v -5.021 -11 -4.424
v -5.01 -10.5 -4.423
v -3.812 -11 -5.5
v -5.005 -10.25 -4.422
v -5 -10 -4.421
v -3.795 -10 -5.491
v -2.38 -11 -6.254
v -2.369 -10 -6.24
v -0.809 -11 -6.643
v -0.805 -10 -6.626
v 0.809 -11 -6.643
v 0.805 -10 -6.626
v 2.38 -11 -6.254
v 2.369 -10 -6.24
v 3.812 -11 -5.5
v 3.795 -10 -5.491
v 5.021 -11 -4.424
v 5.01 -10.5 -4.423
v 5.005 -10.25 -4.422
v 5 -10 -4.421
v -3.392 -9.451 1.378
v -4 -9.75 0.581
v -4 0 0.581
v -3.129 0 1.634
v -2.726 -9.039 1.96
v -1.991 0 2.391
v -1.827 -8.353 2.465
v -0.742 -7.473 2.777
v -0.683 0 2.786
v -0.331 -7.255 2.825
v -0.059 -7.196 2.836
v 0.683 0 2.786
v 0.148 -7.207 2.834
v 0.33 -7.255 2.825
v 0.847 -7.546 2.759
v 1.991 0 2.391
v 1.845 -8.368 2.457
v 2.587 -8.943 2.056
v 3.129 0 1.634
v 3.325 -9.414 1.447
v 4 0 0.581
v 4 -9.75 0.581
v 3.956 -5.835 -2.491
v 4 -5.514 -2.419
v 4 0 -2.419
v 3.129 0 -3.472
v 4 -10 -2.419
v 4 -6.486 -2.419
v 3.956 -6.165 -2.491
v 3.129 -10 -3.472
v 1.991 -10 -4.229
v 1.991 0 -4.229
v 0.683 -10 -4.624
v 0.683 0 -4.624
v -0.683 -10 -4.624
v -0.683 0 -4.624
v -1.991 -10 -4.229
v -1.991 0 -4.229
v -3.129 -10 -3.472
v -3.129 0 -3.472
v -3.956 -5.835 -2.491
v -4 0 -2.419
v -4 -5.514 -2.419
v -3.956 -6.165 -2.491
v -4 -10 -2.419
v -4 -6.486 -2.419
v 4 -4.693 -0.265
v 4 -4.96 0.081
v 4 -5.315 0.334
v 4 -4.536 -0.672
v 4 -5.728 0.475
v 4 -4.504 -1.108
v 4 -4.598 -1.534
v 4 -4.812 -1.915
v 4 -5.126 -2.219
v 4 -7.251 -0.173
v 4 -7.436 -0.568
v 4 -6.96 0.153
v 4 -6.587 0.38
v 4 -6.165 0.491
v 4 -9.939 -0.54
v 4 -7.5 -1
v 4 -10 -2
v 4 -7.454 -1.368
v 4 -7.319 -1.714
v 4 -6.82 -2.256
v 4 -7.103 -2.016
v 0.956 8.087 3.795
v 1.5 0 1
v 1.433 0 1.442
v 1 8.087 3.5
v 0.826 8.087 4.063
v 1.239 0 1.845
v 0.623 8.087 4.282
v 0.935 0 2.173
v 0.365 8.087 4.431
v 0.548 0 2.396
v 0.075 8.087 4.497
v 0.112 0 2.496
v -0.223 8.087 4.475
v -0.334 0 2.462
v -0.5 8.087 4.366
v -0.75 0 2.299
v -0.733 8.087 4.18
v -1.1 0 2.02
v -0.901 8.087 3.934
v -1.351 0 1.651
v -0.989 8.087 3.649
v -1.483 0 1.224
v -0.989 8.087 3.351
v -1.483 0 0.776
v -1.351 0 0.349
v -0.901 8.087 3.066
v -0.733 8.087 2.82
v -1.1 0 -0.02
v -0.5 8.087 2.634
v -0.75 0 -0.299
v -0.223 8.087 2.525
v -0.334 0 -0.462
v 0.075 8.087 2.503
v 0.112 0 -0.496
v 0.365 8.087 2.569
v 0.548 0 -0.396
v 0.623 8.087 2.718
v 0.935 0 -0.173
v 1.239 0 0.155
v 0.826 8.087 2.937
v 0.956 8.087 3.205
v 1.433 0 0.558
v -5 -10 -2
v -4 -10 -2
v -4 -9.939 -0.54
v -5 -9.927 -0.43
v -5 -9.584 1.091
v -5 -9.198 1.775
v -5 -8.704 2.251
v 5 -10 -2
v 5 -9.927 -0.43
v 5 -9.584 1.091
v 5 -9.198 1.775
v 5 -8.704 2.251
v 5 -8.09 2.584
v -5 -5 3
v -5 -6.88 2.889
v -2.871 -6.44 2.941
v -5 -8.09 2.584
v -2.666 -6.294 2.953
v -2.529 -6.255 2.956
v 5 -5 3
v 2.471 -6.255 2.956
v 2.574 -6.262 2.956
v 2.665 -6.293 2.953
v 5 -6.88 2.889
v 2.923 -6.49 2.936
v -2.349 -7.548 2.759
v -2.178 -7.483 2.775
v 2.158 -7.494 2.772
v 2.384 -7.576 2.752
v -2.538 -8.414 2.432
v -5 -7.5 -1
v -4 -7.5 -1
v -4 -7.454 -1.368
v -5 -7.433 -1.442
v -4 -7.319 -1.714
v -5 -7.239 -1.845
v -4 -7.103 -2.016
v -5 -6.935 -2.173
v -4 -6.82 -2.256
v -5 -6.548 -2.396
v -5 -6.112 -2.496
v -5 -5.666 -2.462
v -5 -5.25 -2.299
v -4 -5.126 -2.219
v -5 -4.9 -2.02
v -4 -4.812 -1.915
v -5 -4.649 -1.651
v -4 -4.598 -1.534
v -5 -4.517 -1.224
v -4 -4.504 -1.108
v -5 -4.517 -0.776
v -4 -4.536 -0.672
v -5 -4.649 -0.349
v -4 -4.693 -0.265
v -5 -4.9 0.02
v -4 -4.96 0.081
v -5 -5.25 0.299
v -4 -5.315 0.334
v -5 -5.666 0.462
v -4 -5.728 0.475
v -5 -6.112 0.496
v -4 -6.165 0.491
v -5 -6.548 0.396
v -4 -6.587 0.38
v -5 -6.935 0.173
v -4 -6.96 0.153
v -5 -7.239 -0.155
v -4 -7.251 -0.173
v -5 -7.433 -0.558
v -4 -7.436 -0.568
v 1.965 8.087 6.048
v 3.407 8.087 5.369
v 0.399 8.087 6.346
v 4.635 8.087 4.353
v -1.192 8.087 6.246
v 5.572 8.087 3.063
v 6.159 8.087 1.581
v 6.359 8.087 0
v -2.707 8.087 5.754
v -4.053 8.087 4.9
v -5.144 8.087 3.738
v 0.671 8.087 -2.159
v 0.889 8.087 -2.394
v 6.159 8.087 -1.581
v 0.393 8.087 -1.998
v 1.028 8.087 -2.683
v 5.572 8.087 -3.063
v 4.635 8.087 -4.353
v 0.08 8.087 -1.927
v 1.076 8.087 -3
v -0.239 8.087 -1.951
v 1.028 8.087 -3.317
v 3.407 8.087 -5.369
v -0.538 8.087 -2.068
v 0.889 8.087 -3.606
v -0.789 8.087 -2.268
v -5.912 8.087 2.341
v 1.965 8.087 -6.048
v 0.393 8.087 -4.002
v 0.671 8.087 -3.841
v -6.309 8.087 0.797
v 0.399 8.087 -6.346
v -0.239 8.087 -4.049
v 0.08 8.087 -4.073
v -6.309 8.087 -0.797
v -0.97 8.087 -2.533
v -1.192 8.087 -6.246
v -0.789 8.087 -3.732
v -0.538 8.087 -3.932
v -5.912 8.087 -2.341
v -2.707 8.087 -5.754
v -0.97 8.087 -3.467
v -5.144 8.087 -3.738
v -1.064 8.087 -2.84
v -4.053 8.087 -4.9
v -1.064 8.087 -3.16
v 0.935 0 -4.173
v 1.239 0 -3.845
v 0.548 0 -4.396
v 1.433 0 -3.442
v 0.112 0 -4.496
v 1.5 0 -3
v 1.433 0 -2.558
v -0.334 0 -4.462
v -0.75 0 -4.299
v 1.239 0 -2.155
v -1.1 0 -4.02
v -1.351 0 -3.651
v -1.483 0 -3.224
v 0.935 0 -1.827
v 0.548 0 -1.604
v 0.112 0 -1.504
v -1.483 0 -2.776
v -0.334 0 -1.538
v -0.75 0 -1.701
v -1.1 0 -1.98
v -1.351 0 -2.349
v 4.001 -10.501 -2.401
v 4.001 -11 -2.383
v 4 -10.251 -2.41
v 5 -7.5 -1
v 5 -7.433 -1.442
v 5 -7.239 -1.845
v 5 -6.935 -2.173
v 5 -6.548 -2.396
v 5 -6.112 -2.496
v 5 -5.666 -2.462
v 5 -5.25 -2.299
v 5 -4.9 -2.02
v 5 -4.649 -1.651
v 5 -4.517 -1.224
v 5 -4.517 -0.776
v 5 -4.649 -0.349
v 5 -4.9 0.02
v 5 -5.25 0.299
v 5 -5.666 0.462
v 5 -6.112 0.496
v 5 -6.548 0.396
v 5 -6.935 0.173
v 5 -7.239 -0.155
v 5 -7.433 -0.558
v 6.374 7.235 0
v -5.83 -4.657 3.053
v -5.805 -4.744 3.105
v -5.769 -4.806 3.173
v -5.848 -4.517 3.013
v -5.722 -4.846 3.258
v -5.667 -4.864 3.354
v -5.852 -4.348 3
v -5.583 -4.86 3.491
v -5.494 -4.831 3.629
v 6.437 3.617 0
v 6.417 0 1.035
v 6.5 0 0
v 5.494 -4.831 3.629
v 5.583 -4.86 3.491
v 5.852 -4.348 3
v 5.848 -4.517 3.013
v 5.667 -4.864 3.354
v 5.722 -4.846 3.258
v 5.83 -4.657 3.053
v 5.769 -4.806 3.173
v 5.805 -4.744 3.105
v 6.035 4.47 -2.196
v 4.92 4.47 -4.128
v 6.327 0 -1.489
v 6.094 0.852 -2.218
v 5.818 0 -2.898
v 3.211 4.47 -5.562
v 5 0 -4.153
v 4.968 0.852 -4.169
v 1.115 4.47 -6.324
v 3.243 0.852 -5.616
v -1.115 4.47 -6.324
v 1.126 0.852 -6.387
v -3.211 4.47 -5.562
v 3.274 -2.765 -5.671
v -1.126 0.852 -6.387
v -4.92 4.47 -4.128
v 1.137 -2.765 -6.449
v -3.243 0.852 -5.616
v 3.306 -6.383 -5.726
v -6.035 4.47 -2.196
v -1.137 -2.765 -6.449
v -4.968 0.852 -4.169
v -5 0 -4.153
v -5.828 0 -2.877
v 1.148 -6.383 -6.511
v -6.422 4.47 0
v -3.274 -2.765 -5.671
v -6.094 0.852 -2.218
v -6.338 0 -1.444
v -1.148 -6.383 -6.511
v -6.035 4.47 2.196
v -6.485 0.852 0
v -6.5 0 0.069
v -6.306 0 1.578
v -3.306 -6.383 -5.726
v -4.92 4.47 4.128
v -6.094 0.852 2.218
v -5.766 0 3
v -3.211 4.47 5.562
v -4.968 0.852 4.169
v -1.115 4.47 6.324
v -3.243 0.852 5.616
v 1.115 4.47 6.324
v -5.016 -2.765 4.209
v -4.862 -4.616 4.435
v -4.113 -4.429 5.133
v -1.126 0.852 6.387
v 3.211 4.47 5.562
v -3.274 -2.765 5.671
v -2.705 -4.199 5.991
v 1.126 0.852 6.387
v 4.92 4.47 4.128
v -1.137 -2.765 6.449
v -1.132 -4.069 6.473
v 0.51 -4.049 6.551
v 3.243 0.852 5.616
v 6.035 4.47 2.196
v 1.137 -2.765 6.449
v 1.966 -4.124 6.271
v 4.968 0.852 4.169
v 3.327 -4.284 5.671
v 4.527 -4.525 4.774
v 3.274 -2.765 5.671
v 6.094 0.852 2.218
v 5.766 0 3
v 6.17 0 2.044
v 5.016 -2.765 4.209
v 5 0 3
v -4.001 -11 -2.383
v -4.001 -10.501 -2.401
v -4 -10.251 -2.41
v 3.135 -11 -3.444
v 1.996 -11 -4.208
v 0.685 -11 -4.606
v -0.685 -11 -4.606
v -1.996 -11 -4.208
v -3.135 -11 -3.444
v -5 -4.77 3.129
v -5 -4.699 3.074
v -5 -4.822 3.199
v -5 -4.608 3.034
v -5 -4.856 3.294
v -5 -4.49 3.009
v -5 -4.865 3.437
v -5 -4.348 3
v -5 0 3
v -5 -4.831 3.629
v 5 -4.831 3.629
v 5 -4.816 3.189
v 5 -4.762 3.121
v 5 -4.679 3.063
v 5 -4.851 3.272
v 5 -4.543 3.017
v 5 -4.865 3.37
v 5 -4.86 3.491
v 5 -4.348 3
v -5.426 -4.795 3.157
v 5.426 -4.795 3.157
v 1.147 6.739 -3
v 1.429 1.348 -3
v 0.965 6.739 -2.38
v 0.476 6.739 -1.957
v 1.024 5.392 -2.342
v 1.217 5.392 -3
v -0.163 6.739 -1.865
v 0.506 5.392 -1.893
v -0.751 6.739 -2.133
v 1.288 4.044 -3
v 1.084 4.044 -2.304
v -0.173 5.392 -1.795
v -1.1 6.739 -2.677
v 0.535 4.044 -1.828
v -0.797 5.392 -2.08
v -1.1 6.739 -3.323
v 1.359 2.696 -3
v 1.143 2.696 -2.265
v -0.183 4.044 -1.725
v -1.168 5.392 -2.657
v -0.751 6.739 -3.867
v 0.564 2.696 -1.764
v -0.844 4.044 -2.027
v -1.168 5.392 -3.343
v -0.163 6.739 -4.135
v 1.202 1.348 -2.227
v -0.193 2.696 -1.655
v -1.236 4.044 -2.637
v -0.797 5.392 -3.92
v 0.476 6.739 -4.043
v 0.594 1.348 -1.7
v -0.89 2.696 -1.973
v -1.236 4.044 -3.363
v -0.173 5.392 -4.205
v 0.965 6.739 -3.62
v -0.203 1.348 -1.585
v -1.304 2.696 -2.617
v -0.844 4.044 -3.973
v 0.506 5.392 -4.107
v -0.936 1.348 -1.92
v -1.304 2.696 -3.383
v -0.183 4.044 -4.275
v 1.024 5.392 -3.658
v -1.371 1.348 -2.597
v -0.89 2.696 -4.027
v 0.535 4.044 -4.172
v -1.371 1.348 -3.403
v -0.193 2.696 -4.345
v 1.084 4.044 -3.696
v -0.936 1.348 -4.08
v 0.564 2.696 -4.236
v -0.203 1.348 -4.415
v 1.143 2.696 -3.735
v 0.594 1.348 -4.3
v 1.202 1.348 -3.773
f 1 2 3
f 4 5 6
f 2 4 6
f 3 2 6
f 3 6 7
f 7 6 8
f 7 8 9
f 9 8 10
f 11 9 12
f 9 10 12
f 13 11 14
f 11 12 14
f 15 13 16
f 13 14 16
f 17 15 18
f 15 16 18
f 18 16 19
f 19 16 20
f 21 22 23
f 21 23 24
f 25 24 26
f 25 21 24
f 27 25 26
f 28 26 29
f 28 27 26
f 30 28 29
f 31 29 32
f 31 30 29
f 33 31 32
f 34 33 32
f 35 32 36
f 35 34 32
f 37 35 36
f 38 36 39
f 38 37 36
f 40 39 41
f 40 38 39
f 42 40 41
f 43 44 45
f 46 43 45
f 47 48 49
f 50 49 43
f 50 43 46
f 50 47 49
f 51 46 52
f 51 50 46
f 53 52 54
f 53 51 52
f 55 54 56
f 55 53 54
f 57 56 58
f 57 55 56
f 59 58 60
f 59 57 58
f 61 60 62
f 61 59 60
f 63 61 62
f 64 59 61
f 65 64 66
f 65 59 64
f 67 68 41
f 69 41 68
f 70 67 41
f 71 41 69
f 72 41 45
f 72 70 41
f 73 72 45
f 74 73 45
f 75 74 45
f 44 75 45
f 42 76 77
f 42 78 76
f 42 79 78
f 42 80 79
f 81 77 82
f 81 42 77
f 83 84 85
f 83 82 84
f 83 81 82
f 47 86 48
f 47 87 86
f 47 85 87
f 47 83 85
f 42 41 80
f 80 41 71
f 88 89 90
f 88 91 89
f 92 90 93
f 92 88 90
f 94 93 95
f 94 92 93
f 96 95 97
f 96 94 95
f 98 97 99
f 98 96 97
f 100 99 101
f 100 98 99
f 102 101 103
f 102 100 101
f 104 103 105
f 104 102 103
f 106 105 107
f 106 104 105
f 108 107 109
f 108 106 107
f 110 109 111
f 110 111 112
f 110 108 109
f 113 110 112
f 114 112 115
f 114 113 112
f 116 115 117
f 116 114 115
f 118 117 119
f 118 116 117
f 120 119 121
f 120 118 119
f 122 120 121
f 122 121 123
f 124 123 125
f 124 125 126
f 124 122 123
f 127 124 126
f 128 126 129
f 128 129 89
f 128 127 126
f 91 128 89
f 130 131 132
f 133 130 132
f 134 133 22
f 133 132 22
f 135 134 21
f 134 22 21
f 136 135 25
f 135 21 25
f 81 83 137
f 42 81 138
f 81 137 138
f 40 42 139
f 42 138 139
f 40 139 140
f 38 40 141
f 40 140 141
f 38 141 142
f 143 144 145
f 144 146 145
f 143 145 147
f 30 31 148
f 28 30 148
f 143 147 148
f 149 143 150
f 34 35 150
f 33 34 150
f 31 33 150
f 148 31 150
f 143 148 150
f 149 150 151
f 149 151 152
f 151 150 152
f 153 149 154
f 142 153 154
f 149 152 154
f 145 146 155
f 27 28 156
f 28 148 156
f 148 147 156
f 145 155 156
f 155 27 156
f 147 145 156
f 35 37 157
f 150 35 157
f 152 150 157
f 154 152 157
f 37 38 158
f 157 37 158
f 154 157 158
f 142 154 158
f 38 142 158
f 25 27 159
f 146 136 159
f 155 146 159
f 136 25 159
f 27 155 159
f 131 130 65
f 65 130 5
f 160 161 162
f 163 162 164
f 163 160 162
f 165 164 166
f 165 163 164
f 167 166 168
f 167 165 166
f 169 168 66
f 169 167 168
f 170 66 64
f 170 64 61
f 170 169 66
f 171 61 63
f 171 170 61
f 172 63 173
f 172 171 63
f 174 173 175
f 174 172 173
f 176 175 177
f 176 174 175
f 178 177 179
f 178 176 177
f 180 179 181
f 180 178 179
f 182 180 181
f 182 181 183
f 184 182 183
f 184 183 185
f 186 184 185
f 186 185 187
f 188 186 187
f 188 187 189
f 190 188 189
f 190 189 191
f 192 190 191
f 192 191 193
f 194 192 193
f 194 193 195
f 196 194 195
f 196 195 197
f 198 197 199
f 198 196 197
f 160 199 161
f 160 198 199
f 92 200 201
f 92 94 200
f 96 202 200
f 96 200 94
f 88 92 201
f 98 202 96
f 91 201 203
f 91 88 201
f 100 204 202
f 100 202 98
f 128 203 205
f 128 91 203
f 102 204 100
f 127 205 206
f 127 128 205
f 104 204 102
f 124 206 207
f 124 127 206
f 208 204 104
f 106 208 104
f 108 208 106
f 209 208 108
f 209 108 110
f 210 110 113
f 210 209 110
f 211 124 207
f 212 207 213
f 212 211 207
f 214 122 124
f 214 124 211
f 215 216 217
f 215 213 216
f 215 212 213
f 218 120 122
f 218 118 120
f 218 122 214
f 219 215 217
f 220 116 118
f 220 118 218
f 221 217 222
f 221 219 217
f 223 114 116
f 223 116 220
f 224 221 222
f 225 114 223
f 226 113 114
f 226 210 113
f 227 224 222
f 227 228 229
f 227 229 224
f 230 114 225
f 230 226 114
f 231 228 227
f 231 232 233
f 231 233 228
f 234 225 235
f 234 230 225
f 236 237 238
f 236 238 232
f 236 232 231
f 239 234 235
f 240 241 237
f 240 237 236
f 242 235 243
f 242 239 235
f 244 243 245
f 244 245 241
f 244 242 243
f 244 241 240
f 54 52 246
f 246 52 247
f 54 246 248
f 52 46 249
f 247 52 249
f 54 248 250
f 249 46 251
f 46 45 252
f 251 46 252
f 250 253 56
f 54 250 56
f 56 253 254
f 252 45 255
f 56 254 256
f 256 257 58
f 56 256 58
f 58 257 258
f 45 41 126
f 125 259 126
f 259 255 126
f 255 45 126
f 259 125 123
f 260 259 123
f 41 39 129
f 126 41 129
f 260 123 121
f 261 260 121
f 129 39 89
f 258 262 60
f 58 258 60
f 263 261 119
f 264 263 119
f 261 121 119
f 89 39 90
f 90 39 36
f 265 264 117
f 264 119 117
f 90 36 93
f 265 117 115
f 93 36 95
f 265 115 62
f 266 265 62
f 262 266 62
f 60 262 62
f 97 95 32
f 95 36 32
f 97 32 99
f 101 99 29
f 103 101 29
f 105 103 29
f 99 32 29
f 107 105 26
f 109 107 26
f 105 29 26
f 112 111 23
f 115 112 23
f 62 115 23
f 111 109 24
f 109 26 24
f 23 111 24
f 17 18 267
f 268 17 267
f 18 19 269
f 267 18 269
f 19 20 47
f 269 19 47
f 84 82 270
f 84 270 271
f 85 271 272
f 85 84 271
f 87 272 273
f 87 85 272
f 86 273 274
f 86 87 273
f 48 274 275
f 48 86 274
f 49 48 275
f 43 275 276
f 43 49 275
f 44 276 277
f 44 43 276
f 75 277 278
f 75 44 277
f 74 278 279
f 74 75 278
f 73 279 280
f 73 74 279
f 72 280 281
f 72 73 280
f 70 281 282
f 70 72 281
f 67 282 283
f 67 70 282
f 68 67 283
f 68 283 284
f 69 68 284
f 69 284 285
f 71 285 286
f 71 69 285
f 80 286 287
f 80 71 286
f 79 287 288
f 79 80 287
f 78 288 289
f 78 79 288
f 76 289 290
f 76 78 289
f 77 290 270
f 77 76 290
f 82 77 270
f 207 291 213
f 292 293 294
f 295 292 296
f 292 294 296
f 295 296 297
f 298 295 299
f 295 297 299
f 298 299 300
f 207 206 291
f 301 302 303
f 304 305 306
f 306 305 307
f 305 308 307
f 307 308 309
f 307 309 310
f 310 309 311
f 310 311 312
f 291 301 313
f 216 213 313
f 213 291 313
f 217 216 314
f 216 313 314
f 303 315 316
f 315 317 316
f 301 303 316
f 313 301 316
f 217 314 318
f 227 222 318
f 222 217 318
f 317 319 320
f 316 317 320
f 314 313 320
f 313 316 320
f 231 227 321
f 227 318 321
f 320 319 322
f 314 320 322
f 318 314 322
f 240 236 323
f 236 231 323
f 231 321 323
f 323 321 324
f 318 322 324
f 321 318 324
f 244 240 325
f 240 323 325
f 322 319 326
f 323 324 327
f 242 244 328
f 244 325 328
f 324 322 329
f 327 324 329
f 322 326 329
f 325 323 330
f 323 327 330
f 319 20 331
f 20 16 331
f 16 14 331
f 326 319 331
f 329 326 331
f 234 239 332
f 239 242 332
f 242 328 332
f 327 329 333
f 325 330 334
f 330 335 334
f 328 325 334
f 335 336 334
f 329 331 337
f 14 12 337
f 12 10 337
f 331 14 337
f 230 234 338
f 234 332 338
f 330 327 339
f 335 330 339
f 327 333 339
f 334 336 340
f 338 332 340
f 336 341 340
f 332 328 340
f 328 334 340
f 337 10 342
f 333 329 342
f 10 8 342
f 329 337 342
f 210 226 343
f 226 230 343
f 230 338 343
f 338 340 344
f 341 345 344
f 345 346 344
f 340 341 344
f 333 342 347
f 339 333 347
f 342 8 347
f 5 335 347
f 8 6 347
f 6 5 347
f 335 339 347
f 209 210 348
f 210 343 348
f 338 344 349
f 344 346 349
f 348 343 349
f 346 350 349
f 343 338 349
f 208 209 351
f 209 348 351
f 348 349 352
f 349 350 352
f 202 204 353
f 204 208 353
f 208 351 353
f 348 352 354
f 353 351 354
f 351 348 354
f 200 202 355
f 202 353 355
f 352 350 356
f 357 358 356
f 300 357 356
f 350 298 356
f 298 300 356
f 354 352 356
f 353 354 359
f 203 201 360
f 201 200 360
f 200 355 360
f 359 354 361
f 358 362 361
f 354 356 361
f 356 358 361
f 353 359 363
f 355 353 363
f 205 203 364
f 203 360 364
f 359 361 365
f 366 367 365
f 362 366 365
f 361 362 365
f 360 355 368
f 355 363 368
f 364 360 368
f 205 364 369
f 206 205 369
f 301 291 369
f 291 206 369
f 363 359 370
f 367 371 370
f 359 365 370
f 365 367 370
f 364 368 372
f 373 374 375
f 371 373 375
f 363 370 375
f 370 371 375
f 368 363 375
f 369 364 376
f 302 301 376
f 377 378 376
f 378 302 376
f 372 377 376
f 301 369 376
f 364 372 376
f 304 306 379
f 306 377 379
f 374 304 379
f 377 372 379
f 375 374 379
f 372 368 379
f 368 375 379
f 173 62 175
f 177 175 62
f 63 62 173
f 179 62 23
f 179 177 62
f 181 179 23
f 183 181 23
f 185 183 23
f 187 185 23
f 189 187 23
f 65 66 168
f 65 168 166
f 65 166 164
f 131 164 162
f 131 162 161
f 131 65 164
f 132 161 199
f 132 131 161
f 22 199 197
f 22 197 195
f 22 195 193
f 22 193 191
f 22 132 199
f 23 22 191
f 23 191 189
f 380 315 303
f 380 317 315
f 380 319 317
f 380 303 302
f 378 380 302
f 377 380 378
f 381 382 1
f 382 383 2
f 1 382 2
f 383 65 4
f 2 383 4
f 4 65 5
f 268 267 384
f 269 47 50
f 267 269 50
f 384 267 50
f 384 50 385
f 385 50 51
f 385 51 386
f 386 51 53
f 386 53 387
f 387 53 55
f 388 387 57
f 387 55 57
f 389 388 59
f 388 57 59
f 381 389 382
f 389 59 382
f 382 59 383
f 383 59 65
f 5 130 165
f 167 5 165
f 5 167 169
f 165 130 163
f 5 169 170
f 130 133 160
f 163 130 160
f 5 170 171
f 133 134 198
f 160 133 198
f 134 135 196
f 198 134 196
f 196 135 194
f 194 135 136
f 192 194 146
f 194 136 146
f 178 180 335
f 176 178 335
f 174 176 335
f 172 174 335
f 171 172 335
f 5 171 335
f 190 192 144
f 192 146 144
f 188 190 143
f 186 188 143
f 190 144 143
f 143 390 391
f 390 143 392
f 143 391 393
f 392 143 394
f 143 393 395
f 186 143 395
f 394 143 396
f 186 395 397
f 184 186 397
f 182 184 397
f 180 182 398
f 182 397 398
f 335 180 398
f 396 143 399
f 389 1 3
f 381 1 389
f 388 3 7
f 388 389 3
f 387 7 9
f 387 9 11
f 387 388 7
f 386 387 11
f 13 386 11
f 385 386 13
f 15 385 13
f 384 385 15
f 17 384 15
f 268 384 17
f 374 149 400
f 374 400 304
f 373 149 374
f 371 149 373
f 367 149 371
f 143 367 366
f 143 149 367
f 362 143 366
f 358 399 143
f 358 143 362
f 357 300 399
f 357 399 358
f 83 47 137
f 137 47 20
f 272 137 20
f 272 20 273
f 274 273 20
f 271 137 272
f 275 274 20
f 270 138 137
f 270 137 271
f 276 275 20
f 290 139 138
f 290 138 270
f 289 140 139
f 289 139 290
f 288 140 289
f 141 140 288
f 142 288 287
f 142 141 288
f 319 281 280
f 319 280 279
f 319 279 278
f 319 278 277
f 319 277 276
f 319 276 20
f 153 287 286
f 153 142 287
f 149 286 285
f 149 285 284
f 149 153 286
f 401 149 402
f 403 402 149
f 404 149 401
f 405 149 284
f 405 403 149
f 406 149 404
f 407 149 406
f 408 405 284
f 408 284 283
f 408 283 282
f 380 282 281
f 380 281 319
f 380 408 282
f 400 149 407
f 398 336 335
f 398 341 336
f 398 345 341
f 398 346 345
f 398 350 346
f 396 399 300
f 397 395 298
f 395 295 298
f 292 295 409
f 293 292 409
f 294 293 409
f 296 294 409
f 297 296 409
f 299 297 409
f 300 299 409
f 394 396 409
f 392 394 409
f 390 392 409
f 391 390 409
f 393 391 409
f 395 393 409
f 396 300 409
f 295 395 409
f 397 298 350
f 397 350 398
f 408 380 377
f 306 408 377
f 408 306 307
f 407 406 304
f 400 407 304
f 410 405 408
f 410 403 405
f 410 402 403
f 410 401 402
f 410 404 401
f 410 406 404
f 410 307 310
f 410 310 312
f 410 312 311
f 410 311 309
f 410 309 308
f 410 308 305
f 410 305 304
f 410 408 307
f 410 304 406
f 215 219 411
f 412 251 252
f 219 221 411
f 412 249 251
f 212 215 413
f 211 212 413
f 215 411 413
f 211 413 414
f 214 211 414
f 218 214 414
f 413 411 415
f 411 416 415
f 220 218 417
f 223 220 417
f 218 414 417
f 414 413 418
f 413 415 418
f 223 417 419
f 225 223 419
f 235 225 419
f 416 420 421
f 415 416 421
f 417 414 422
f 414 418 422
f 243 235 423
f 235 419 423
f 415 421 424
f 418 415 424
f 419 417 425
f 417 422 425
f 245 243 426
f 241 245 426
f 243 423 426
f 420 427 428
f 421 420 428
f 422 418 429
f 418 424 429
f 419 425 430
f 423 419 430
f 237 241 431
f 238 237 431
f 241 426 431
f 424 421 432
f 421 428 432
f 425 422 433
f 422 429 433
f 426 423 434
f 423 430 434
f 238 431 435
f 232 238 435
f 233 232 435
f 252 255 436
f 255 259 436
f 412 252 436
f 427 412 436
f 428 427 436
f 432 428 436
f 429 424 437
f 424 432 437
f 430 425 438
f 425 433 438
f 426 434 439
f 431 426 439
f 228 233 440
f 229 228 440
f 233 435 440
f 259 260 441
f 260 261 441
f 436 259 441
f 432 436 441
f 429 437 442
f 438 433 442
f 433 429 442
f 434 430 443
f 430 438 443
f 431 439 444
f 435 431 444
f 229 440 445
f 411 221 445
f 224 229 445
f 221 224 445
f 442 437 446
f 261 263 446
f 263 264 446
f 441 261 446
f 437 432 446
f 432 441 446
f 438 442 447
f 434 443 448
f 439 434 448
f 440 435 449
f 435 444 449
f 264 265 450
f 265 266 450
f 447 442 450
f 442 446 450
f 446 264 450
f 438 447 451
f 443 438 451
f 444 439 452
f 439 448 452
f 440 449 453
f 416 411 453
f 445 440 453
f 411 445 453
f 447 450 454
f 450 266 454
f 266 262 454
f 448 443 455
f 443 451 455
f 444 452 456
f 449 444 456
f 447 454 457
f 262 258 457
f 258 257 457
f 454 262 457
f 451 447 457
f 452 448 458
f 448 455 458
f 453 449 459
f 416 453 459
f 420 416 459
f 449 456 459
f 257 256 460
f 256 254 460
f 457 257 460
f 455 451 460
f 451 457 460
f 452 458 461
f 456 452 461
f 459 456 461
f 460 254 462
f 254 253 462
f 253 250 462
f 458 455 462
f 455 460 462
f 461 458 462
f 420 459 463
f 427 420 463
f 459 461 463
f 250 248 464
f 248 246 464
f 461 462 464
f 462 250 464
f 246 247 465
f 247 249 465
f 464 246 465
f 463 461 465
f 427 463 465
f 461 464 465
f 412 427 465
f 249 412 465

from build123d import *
from build123d.topology import SkipClean

# Parameters (mm, degrees)
SKETCH1_R                     = 6.5
BOSS_EXTRUDE1_DEPTH           = 18
BOSS_EXTRUDE1_TAPER           = 1
BOSS_EXTRUDE1_OTHER_WAY_DEPTH = 10
BOSS_EXTRUDE1_OTHER_WAY_TAPER = -1
SKETCH2_W                     = 5.545055897
SKETCH2_H                     = 10
CUT_EXTRUDE1_DEPTH            = 22.497594206
CUT_EXTRUDE2_DEPTH            = 23.378552983
CUT_EXTRUDE2_DEPTH_BACK       = 23.378552983
CUT_EXTRUDE3_DEPTH            = 23.378552983
CUT_EXTRUDE3_DEPTH_BACK       = 23.378552983
SKETCH4_R                     = 1.5
FILLET1_SIZE                  = 5
CUT_EXTRUDE4_DEPTH            = 21.268192633
CUT_EXTRUDE4_DEPTH_BACK       = 21.268192633
SKETCH5_W                     = 18.469746175
SKETCH5_H                     = 12.695602453
CUT_EXTRUDE5_DEPTH            = 10
BOSS_EXTRUDE3_DEPTH           = 1
BOSS_EXTRUDE3_DRAFT           = -1
SKETCH11_R                    = 1.5
CUT_EXTRUDE7_DEPTH            = 15.423347107
CUT_EXTRUDE7_DRAFT            = -3
SKETCH12_R                    = 1.5
SKETCH13_R                    = 1


with BuildPart() as part:
    # Sketch1 → Boss-Extrude1 (new body)
    with BuildSketch(Plane(origin=(0, 0, 0), x_dir=(1, 0, 0), z_dir=(0, 1, 0))):
        Circle(SKETCH1_R)
    extrude(amount=BOSS_EXTRUDE1_DEPTH, taper=BOSS_EXTRUDE1_TAPER)

    # Sketch1 → Boss-Extrude1 other way (add)
    with BuildSketch(Plane(origin=(0, 0, 0), x_dir=(1, 0, 0), z_dir=(0, 1, 0))):
        Circle(SKETCH1_R)
    extrude(amount=-BOSS_EXTRUDE1_OTHER_WAY_DEPTH, taper=BOSS_EXTRUDE1_OTHER_WAY_TAPER)

    # Sketch2 → Cut-Extrude1 (cut, through all)
    with BuildSketch(Plane.XY.offset(3)):
        with Locations((-7.772527949, -5)):
            Rectangle(SKETCH2_W, SKETCH2_H)
        with Locations((7.772527949, -5)):
            Rectangle(SKETCH2_W, SKETCH2_H)
    extrude(amount=-CUT_EXTRUDE1_DEPTH, mode=Mode.SUBTRACT)

    # Sketch3 → Cut-Extrude2 (cut, two sides: drawn at the far end of the back side and taken through both)
    with BuildSketch(Plane(origin=(5, 0, 0), x_dir=(0, 0, -1), z_dir=(1, 0, 0)).offset(-CUT_EXTRUDE2_DEPTH_BACK)):
        Polygon((-3, -10), (-3, -5), (-18.921941618, -0.733728602), (-18.921941618, -10), align=None)
    extrude(amount=CUT_EXTRUDE2_DEPTH + CUT_EXTRUDE2_DEPTH_BACK, mode=Mode.SUBTRACT)

    # Sketch4 → Cut-Extrude3 (cut, two sides: drawn at the far end of the back side and taken through both)
    with BuildSketch(Plane(origin=(5, 0, 0), x_dir=(0, 0, -1), z_dir=(1, 0, 0)).offset(-CUT_EXTRUDE3_DEPTH_BACK)):
        with Locations(Location((1, -6, 0), (0, 0, 270))):
            Circle(SKETCH4_R)
    extrude(amount=CUT_EXTRUDE3_DEPTH + CUT_EXTRUDE3_DEPTH_BACK, mode=Mode.SUBTRACT)

    # Fillet1
    # a fillet whose section is not a circle: 5 mm, written as the material it takes off along each edge
    with BuildSketch(Plane(origin=(17.5, -10, 3), x_dir=(0, 0, -1), z_dir=(-1, 0, 0))) as fillet1_piece_1:
        with BuildLine():
            Bezier((FILLET1_SIZE, 0), (0, 0), (0, -FILLET1_SIZE), weights=[1, 1.5, 1])
            Line((0, -FILLET1_SIZE), (0, 0))
            Line((0, 0), (FILLET1_SIZE, 0))
        make_face()
    extrude(amount=35, mode=Mode.SUBTRACT)

    # Fillet2
    # a fillet whose section is not a circle: 10, 5 mm, written as the material it takes off along each edge
    with BuildSketch(Plane(origin=(0, 18, 0), x_dir=(1, 0, 0), z_dir=(0, 0, -1))) as fillet2_piece_1:
        with BuildLine():
            Bezier((6.358836316, 9.912737968), (6.185808831, 0), (1.35959784, 0), weights=[1, 0.818181818, 1])
            Line((1.35959784, 0), (6.185808831, 0))
            Line((6.185808831, 0), (6.358836316, 9.912737968))
        make_face()
    revolve(axis=Axis((0, 18, 0), (0, -1, 0)), mode=Mode.SUBTRACT)

    # Sketch5 → Cut-Extrude4 (cut, two sides: drawn at the far end of the back side and taken through both)
    with BuildSketch(Plane(origin=(0, 0, 0), x_dir=(0, 0, -1), z_dir=(1, 0, 0)).offset(-CUT_EXTRUDE4_DEPTH_BACK)):
        with Locations((0.914582981, 14.435063259)):
            Rectangle(SKETCH5_W, SKETCH5_H)
    extrude(amount=CUT_EXTRUDE4_DEPTH + CUT_EXTRUDE4_DEPTH_BACK, mode=Mode.SUBTRACT)

    # Sketch6 → Cut-Extrude5 (cut)
    with BuildSketch(Plane.XZ.offset(10)):
        with BuildLine():
            Line((-4, -2.418971635), (-4, 0.581028365))
            ThreePointArc((-4, 0.581028365), (0, 2.836607379), (4, 0.581028365))
            Line((4, 0.581028365), (4, -2.418971635))
            ThreePointArc((4, -2.418971635), (0, -4.674550649), (-4, -2.418971635))
        make_face()
    extrude(amount=-CUT_EXTRUDE5_DEPTH, mode=Mode.SUBTRACT)

    # Fillet3
    # a fillet whose section is not a circle: 0.5 mm, written as the material it takes off along each edge
    with BuildSketch(Plane(origin=(5, -5, 3), x_dir=(0, 1, 0), z_dir=(1, 0, 0))) as fillet3_piece_1:
        with BuildLine():
            Bezier((0.651612686, 0), (0, 0), (0.168649773, 0.629409523), weights=[1, 1, 1])
            Line((0.168649773, 0.629409523), (0, 0))
            Line((0, 0), (0.651612686, 0))
        make_face()
    extrude(amount=2.493517729, mode=Mode.SUBTRACT)
    with BuildSketch(Plane(origin=(-7.493517729, -5, 3), x_dir=(0, 0.258819045102518, 0.9659258262890691), z_dir=(1, 0, 0))) as fillet3_piece_2:
        with BuildLine():
            Bezier((0.651612686, 0), (0, 0), (0.168649773, -0.629409523), weights=[1, 1, 1])
            Line((0.168649773, -0.629409523), (0, 0))
            Line((0, 0), (0.651612686, 0))
        make_face()
    extrude(amount=2.493517729, mode=Mode.SUBTRACT)


with BuildPart() as boss_extrude3_tool:
    # Sketch9 → Boss-Extrude3 (with draft: the straight prism first)
    with BuildSketch(Plane.XZ.offset(10)):
        with BuildLine():
            Line((-4, -2.418971635), (-5, -4.421495943))
            ThreePointArc((-5, -4.421495943), (0, -6.674550649), (5, -4.421495943))
            Line((5, -4.421495943), (4, -2.418971635))
            ThreePointArc((4, -2.418971635), (0, -4.674550649), (-4, -2.418971635))
        make_face()
    extrude(amount=BOSS_EXTRUDE3_DEPTH)
    # Boss-Extrude3: the draft: its side faces are tilted about the plane it starts from
    boss_extrude3_sides = [boss_extrude3_tool.faces().sort_by_distance(p)[0] for p in [
        (0, -10.5, -6.674550649),
        (4.5, -10.5, -3.420233789),
        (0, -10.5, -4.674550649),
        (-4.5, -10.5, -3.420233789),
    ]]
    draft(boss_extrude3_sides, Plane.XZ.offset(10), BOSS_EXTRUDE3_DRAFT)


with BuildPart() as part_1:
    add(part.part)

    # Boss-Extrude3: add boss_extrude3_tool
    add(boss_extrude3_tool.part)


with BuildPart() as cut_extrude7_tool:
    # Sketch11 → Cut-Extrude7 (with draft: the straight prism first)
    with BuildSketch(Plane.XZ):
        with Locations((0, -3)):
            Circle(SKETCH11_R)
    extrude(amount=-CUT_EXTRUDE7_DEPTH)
    # Cut-Extrude7: the draft: its side faces are tilted about the plane it starts from
    cut_extrude7_sides = [cut_extrude7_tool.faces().sort_by_distance(p)[0] for p in [
        (-1.5, 7.711673554, -3),
    ]]
    draft(cut_extrude7_sides, Plane.XZ, CUT_EXTRUDE7_DRAFT)


with BuildPart() as part_2:
    add(part_1.part)

    # Cut-Extrude7: cut by cut_extrude7_tool
    add(cut_extrude7_tool.part, mode=Mode.SUBTRACT)

    # Sketch12 → Cut-Loft1 section 0
    with SkipClean():  # the faces are left unmerged after this step: merging them gives an invalid solid
        with BuildSketch(Plane.XZ):
            with Locations((0, 1)):
                Circle(SKETCH12_R)
        # Sketch13 → Cut-Loft1 section 1
        with BuildSketch(Plane(origin=(0, 8.087262032, 0), x_dir=(1, 0, 0), z_dir=(0, 1, 0))):
            with Locations((0, -3.5)):
                Circle(SKETCH13_R)
        loft(mode=Mode.SUBTRACT)


solid = part_2.part
